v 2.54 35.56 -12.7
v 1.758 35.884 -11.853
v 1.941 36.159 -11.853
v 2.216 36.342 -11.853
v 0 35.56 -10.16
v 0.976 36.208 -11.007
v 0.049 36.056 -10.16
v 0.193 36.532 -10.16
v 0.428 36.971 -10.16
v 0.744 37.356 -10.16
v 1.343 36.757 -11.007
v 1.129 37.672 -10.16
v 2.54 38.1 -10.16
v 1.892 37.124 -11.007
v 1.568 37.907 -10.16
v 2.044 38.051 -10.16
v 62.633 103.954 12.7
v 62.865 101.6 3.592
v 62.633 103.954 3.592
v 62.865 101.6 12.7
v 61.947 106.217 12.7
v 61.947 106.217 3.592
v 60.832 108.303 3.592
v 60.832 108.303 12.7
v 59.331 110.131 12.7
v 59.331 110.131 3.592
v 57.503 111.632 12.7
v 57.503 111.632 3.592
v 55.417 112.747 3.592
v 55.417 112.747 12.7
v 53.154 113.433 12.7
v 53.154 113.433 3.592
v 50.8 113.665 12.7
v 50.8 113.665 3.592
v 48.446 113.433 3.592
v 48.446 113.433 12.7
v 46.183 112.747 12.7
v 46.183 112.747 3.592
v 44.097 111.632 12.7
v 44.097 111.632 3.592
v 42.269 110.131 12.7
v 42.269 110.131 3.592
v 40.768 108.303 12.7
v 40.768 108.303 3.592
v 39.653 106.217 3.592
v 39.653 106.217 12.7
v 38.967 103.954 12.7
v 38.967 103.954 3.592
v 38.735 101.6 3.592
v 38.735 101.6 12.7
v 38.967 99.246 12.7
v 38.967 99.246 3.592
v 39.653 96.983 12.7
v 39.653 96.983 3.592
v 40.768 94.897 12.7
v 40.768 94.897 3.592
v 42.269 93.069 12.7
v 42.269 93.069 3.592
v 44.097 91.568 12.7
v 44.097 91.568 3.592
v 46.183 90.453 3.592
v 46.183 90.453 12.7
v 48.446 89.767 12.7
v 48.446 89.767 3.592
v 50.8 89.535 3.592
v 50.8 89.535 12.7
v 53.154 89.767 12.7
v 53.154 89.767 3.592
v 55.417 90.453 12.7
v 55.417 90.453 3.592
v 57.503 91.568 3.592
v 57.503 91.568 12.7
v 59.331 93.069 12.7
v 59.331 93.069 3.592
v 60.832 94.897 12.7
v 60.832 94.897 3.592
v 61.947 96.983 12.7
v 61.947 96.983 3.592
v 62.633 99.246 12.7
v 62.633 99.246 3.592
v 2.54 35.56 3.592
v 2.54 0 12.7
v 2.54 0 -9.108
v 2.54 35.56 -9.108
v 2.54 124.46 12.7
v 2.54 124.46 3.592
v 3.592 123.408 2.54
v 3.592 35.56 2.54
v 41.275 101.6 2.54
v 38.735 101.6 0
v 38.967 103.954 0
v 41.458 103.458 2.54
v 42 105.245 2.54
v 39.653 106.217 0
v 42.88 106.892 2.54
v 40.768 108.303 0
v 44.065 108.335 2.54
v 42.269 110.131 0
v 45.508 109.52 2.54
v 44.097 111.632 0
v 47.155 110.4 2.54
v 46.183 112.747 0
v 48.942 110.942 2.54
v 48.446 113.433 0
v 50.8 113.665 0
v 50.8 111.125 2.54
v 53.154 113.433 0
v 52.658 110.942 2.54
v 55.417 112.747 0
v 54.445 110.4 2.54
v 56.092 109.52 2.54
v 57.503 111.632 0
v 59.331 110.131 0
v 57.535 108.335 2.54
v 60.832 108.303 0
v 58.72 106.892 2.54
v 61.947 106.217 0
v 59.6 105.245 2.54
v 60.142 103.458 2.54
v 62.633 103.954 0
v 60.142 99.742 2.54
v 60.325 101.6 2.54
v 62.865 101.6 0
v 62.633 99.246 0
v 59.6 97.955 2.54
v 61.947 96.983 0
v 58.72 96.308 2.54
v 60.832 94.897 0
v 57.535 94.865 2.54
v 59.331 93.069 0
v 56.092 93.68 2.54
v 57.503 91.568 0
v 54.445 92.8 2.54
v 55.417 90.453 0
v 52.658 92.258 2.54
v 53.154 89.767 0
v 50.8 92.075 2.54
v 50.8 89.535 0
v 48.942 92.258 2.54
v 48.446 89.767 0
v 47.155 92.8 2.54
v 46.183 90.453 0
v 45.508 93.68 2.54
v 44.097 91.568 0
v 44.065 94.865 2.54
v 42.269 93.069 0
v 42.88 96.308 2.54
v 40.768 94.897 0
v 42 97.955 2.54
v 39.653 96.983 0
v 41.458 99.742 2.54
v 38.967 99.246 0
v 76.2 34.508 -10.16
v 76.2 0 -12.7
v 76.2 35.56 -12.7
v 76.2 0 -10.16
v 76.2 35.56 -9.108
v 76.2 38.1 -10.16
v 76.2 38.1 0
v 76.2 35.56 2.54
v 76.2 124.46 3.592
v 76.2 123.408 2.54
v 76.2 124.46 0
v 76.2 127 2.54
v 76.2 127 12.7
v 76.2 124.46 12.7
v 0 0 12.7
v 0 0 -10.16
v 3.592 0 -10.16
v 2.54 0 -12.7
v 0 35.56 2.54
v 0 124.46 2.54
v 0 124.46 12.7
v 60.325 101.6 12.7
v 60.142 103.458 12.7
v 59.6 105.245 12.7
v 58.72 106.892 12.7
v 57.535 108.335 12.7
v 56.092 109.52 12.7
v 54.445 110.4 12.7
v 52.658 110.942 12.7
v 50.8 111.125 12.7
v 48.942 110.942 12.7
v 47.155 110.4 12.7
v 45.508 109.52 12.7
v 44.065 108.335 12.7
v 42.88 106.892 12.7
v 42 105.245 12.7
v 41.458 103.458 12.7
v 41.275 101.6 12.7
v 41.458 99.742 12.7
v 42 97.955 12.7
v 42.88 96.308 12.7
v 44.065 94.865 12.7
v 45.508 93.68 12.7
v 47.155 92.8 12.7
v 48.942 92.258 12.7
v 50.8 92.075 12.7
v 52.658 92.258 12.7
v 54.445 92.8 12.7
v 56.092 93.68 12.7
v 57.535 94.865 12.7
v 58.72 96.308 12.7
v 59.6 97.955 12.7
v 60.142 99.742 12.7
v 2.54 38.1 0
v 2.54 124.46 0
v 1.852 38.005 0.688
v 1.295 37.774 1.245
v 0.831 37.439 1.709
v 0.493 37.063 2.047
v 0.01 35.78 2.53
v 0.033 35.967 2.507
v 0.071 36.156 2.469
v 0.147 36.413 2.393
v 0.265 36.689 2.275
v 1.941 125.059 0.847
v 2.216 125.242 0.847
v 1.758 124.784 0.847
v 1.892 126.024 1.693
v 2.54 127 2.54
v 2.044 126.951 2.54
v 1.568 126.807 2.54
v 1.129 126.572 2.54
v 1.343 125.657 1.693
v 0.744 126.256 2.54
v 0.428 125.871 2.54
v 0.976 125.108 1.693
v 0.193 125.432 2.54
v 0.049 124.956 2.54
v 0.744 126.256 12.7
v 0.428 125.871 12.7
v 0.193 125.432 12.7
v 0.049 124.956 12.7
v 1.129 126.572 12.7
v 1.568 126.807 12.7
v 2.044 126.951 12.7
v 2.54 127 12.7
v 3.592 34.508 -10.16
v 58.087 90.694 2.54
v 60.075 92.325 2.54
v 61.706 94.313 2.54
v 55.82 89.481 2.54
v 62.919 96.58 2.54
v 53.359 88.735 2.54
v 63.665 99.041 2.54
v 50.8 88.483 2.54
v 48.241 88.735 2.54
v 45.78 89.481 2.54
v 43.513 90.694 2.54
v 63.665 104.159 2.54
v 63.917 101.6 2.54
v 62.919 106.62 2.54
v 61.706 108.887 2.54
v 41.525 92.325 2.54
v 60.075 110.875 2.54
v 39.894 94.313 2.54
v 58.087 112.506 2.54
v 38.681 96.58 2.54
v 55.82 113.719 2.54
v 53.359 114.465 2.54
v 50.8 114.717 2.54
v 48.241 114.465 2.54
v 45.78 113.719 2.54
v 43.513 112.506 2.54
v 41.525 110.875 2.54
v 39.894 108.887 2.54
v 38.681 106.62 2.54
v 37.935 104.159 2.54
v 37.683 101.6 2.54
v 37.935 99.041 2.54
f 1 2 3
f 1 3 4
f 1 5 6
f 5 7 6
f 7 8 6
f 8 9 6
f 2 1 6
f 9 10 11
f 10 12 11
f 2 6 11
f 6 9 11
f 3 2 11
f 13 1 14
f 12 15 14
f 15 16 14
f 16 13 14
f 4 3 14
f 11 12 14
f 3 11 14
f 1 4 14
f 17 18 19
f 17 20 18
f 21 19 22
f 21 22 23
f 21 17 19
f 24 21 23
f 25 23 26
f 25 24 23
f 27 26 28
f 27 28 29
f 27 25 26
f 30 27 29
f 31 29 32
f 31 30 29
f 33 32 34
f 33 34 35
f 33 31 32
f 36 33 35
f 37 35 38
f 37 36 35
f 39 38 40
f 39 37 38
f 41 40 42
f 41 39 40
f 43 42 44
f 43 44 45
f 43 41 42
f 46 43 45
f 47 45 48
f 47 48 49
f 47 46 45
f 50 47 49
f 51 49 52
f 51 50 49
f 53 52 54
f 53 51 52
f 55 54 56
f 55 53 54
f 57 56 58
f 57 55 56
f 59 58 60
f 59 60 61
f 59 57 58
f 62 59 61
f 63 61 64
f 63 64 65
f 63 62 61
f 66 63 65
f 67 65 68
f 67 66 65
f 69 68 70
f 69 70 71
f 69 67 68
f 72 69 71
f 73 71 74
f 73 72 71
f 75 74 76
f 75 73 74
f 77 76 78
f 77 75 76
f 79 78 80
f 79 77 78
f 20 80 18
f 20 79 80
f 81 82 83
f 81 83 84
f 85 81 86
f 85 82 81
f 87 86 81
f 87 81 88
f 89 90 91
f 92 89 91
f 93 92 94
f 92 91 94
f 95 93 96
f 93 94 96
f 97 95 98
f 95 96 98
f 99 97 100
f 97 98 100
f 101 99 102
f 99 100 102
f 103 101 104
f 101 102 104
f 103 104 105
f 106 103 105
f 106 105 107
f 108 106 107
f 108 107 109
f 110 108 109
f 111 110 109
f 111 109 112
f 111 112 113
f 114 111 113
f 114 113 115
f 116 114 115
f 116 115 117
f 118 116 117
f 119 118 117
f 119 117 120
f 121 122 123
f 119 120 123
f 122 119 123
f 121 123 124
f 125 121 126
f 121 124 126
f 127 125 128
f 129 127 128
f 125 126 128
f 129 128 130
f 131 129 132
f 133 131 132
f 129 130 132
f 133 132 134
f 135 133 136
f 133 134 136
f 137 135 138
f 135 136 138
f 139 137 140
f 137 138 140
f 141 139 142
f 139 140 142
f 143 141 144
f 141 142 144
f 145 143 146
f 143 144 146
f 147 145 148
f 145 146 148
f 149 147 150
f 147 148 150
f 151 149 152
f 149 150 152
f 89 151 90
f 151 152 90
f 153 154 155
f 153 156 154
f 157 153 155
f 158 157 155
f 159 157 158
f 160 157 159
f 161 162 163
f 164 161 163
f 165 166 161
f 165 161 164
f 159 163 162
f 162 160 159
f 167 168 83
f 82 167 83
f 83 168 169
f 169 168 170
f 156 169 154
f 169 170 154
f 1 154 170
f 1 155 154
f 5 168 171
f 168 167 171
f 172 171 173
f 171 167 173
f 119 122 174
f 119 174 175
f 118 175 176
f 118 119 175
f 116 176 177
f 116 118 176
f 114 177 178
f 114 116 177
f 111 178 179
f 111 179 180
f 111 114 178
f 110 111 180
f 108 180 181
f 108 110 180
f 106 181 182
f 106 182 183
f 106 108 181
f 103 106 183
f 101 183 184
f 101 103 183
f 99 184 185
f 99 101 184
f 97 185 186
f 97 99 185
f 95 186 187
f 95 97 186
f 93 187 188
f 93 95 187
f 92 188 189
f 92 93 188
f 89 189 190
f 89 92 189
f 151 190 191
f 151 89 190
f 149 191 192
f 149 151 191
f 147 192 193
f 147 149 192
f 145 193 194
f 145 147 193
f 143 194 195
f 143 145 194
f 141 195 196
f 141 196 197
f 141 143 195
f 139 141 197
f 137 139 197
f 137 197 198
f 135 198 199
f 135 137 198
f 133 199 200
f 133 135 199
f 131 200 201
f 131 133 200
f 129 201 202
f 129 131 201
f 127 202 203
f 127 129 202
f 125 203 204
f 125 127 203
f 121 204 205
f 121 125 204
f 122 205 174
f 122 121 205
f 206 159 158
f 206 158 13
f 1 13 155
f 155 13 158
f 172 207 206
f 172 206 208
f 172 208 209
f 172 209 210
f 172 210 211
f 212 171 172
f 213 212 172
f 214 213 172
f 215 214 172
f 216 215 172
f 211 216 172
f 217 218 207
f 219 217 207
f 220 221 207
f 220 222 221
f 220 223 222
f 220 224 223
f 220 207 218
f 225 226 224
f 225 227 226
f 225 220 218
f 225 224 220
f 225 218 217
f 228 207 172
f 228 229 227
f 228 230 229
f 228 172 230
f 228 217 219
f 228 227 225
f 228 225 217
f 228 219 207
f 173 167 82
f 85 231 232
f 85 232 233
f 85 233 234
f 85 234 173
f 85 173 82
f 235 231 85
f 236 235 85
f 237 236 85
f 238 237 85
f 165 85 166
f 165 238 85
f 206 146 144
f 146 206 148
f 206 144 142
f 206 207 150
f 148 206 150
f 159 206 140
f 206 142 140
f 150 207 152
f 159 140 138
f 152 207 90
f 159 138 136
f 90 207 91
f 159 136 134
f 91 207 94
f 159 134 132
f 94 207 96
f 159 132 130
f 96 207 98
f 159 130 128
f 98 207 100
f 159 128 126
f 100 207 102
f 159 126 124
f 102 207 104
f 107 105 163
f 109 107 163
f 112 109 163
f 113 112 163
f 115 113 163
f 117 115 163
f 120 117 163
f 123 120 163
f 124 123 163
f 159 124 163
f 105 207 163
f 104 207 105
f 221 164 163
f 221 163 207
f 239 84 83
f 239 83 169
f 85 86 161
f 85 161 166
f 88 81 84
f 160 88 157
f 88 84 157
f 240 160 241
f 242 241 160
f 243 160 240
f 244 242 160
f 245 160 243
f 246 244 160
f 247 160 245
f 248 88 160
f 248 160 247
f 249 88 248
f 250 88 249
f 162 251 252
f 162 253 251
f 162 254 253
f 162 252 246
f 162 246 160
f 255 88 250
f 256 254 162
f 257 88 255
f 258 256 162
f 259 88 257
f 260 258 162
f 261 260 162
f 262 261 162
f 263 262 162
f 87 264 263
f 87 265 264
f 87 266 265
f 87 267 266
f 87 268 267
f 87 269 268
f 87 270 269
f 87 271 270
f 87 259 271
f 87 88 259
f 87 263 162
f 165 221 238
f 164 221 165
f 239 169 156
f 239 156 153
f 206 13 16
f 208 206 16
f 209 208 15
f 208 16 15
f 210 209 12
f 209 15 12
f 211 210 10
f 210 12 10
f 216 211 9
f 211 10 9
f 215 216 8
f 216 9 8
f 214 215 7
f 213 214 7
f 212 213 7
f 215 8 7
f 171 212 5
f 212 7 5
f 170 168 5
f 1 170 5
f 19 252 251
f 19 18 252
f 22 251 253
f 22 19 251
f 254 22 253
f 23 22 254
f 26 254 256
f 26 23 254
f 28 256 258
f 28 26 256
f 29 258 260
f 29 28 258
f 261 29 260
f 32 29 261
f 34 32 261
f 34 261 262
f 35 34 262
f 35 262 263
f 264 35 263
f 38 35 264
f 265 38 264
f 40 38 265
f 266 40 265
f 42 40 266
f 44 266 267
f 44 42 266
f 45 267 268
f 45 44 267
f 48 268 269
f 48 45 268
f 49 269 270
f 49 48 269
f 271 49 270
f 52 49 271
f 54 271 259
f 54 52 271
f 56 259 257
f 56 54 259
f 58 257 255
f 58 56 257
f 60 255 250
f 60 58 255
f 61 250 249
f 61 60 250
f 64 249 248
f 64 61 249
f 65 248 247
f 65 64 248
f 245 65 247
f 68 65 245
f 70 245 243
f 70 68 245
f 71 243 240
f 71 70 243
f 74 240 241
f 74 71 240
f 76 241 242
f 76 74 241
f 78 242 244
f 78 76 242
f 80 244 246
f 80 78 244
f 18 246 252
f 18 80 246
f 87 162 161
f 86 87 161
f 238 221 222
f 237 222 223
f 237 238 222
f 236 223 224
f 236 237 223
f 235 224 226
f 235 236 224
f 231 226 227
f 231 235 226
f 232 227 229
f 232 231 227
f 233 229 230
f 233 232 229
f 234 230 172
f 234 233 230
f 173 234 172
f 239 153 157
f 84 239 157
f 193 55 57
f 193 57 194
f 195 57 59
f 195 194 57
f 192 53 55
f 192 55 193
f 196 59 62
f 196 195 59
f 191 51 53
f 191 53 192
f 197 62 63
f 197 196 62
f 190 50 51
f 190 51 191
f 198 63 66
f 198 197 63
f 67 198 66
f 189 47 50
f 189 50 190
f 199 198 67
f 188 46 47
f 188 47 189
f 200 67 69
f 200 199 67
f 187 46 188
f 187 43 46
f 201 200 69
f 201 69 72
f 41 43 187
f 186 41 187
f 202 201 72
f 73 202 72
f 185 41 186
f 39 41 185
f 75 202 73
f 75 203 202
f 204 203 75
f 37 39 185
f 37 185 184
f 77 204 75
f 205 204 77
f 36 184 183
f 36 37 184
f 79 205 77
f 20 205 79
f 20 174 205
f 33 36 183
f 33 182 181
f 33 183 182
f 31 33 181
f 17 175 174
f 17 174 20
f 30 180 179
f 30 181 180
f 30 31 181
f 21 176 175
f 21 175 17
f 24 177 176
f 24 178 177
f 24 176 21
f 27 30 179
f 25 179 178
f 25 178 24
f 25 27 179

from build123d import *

# Parameters (mm, degrees)
SKETCH1_W           = 76.2
SKETCH1_H           = 127
BOSS_EXTRUDE2_DEPTH = 12.7
SKETCH2_W           = 76.2
SKETCH2_H           = 38.1
BOSS_EXTRUDE3_DEPTH = 12.7
SKETCH4_R           = 9.525
CUT_EXTRUDE1_DEPTH  = 149.649688866
FILLET1_R           = 2.54
CHAMFER1_SIZE       = 2.54
SHELL1_START        = 2.54
SHELL1_DEPTH        = 73.66
SHELL1_START_2      = 35.56
SHELL1_3_DEPTH      = 89.44
SHELL1_4_DEPTH      = 35.56


with BuildPart() as part:
    # Sketch1 → Boss-Extrude2 (new body)
    with BuildSketch(Plane.XY):
        with Locations((38.1, 63.5)):
            Rectangle(SKETCH1_W, SKETCH1_H)
    extrude(amount=BOSS_EXTRUDE2_DEPTH)

    # Sketch2 → Boss-Extrude3 (add)
    with BuildSketch(Plane(origin=(0, 0, 0), x_dir=(-1, 0, 0), z_dir=(0, 0, -1))):
        with Locations((-38.1, 19.05)):
            Rectangle(SKETCH2_W, SKETCH2_H)
    extrude(amount=BOSS_EXTRUDE3_DEPTH)

    # Sketch4 → Cut-Extrude1 (cut, through all)
    with BuildSketch(Plane(origin=(0, 0, 0), x_dir=(-1, 0, 0), z_dir=(0, 0, -1))):
        with Locations((-50.8, 101.6)):
            Circle(SKETCH4_R)
    extrude(amount=-CUT_EXTRUDE1_DEPTH, mode=Mode.SUBTRACT)

    # Fillet1
    fillet1_edges = [part.edges().sort_by_distance(p)[0] for p in [
        (0, 38.1, -6.35),
        (0, 127, 6.35),
    ]]
    fillet(fillet1_edges, radius=FILLET1_R)

    # Chamfer1
    chamfer1_edges = [part.edges().sort_by_distance(p)[0] for p in [
        (60.325, 101.6, 0),
        (0, 80.01, 0),
        (0.743948776, 126.256051224, 0),
        (39.37, 127, 0),
        (0, 17.78, -12.7),
        (0.743948776, 37.356051224, -12.7),
        (39.37, 38.1, -12.7),
    ]]
    chamfer(chamfer1_edges, length=CHAMFER1_SIZE)

    # Shell1: read off the stored shape, not the designer's step
    # Shell1 outline → Shell1 (cut)
    with BuildSketch(Plane.YZ.offset(SHELL1_START)):
        Polygon((124.46, 3.592102448), (124.46, 12.7), (0, 12.7), (0, -10.16), (34.507897552, -10.16), (35.56, -9.107897552), (35.56, 2.54), (123.407897552, 2.54), align=None)
    extrude(amount=SHELL1_DEPTH, mode=Mode.SUBTRACT)

    # Shell1 2 outline → Shell1 2 (revolve)
    with BuildSketch(Plane(origin=(50.8, 101.6, 0), x_dir=(1, 0, 0), z_dir=(0, -1, 0))):
        Polygon((12.065, 12.7), (9.525, 12.7), (9.525, 2.54), (13.117102448, 2.54), (12.065, 3.592102448), align=None)
    revolve(axis=Axis((50.8, 101.6, 0), (0, 0, 1)))

    # Shell1 3 outline → Shell1 3 (add)
    with BuildSketch(Plane(origin=(0, 0, 0), x_dir=(1, 0, 0), z_dir=(0, 1, 0)).offset(SHELL1_START_2)):
        Polygon((2.54, -3.592102448), (3.592102448, -2.54), (2.54, -2.54), align=None)
    extrude(amount=SHELL1_3_DEPTH)

    # Shell1 4 outline → Shell1 4 (add)
    with BuildSketch(Plane(origin=(0, 0, 0), x_dir=(1, 0, 0), z_dir=(0, 1, 0))):
        Polygon((2.54, 10.16), (2.54, 9.107897552), (3.592102448, 10.16), align=None)
    extrude(amount=SHELL1_4_DEPTH)


solid = part.part
